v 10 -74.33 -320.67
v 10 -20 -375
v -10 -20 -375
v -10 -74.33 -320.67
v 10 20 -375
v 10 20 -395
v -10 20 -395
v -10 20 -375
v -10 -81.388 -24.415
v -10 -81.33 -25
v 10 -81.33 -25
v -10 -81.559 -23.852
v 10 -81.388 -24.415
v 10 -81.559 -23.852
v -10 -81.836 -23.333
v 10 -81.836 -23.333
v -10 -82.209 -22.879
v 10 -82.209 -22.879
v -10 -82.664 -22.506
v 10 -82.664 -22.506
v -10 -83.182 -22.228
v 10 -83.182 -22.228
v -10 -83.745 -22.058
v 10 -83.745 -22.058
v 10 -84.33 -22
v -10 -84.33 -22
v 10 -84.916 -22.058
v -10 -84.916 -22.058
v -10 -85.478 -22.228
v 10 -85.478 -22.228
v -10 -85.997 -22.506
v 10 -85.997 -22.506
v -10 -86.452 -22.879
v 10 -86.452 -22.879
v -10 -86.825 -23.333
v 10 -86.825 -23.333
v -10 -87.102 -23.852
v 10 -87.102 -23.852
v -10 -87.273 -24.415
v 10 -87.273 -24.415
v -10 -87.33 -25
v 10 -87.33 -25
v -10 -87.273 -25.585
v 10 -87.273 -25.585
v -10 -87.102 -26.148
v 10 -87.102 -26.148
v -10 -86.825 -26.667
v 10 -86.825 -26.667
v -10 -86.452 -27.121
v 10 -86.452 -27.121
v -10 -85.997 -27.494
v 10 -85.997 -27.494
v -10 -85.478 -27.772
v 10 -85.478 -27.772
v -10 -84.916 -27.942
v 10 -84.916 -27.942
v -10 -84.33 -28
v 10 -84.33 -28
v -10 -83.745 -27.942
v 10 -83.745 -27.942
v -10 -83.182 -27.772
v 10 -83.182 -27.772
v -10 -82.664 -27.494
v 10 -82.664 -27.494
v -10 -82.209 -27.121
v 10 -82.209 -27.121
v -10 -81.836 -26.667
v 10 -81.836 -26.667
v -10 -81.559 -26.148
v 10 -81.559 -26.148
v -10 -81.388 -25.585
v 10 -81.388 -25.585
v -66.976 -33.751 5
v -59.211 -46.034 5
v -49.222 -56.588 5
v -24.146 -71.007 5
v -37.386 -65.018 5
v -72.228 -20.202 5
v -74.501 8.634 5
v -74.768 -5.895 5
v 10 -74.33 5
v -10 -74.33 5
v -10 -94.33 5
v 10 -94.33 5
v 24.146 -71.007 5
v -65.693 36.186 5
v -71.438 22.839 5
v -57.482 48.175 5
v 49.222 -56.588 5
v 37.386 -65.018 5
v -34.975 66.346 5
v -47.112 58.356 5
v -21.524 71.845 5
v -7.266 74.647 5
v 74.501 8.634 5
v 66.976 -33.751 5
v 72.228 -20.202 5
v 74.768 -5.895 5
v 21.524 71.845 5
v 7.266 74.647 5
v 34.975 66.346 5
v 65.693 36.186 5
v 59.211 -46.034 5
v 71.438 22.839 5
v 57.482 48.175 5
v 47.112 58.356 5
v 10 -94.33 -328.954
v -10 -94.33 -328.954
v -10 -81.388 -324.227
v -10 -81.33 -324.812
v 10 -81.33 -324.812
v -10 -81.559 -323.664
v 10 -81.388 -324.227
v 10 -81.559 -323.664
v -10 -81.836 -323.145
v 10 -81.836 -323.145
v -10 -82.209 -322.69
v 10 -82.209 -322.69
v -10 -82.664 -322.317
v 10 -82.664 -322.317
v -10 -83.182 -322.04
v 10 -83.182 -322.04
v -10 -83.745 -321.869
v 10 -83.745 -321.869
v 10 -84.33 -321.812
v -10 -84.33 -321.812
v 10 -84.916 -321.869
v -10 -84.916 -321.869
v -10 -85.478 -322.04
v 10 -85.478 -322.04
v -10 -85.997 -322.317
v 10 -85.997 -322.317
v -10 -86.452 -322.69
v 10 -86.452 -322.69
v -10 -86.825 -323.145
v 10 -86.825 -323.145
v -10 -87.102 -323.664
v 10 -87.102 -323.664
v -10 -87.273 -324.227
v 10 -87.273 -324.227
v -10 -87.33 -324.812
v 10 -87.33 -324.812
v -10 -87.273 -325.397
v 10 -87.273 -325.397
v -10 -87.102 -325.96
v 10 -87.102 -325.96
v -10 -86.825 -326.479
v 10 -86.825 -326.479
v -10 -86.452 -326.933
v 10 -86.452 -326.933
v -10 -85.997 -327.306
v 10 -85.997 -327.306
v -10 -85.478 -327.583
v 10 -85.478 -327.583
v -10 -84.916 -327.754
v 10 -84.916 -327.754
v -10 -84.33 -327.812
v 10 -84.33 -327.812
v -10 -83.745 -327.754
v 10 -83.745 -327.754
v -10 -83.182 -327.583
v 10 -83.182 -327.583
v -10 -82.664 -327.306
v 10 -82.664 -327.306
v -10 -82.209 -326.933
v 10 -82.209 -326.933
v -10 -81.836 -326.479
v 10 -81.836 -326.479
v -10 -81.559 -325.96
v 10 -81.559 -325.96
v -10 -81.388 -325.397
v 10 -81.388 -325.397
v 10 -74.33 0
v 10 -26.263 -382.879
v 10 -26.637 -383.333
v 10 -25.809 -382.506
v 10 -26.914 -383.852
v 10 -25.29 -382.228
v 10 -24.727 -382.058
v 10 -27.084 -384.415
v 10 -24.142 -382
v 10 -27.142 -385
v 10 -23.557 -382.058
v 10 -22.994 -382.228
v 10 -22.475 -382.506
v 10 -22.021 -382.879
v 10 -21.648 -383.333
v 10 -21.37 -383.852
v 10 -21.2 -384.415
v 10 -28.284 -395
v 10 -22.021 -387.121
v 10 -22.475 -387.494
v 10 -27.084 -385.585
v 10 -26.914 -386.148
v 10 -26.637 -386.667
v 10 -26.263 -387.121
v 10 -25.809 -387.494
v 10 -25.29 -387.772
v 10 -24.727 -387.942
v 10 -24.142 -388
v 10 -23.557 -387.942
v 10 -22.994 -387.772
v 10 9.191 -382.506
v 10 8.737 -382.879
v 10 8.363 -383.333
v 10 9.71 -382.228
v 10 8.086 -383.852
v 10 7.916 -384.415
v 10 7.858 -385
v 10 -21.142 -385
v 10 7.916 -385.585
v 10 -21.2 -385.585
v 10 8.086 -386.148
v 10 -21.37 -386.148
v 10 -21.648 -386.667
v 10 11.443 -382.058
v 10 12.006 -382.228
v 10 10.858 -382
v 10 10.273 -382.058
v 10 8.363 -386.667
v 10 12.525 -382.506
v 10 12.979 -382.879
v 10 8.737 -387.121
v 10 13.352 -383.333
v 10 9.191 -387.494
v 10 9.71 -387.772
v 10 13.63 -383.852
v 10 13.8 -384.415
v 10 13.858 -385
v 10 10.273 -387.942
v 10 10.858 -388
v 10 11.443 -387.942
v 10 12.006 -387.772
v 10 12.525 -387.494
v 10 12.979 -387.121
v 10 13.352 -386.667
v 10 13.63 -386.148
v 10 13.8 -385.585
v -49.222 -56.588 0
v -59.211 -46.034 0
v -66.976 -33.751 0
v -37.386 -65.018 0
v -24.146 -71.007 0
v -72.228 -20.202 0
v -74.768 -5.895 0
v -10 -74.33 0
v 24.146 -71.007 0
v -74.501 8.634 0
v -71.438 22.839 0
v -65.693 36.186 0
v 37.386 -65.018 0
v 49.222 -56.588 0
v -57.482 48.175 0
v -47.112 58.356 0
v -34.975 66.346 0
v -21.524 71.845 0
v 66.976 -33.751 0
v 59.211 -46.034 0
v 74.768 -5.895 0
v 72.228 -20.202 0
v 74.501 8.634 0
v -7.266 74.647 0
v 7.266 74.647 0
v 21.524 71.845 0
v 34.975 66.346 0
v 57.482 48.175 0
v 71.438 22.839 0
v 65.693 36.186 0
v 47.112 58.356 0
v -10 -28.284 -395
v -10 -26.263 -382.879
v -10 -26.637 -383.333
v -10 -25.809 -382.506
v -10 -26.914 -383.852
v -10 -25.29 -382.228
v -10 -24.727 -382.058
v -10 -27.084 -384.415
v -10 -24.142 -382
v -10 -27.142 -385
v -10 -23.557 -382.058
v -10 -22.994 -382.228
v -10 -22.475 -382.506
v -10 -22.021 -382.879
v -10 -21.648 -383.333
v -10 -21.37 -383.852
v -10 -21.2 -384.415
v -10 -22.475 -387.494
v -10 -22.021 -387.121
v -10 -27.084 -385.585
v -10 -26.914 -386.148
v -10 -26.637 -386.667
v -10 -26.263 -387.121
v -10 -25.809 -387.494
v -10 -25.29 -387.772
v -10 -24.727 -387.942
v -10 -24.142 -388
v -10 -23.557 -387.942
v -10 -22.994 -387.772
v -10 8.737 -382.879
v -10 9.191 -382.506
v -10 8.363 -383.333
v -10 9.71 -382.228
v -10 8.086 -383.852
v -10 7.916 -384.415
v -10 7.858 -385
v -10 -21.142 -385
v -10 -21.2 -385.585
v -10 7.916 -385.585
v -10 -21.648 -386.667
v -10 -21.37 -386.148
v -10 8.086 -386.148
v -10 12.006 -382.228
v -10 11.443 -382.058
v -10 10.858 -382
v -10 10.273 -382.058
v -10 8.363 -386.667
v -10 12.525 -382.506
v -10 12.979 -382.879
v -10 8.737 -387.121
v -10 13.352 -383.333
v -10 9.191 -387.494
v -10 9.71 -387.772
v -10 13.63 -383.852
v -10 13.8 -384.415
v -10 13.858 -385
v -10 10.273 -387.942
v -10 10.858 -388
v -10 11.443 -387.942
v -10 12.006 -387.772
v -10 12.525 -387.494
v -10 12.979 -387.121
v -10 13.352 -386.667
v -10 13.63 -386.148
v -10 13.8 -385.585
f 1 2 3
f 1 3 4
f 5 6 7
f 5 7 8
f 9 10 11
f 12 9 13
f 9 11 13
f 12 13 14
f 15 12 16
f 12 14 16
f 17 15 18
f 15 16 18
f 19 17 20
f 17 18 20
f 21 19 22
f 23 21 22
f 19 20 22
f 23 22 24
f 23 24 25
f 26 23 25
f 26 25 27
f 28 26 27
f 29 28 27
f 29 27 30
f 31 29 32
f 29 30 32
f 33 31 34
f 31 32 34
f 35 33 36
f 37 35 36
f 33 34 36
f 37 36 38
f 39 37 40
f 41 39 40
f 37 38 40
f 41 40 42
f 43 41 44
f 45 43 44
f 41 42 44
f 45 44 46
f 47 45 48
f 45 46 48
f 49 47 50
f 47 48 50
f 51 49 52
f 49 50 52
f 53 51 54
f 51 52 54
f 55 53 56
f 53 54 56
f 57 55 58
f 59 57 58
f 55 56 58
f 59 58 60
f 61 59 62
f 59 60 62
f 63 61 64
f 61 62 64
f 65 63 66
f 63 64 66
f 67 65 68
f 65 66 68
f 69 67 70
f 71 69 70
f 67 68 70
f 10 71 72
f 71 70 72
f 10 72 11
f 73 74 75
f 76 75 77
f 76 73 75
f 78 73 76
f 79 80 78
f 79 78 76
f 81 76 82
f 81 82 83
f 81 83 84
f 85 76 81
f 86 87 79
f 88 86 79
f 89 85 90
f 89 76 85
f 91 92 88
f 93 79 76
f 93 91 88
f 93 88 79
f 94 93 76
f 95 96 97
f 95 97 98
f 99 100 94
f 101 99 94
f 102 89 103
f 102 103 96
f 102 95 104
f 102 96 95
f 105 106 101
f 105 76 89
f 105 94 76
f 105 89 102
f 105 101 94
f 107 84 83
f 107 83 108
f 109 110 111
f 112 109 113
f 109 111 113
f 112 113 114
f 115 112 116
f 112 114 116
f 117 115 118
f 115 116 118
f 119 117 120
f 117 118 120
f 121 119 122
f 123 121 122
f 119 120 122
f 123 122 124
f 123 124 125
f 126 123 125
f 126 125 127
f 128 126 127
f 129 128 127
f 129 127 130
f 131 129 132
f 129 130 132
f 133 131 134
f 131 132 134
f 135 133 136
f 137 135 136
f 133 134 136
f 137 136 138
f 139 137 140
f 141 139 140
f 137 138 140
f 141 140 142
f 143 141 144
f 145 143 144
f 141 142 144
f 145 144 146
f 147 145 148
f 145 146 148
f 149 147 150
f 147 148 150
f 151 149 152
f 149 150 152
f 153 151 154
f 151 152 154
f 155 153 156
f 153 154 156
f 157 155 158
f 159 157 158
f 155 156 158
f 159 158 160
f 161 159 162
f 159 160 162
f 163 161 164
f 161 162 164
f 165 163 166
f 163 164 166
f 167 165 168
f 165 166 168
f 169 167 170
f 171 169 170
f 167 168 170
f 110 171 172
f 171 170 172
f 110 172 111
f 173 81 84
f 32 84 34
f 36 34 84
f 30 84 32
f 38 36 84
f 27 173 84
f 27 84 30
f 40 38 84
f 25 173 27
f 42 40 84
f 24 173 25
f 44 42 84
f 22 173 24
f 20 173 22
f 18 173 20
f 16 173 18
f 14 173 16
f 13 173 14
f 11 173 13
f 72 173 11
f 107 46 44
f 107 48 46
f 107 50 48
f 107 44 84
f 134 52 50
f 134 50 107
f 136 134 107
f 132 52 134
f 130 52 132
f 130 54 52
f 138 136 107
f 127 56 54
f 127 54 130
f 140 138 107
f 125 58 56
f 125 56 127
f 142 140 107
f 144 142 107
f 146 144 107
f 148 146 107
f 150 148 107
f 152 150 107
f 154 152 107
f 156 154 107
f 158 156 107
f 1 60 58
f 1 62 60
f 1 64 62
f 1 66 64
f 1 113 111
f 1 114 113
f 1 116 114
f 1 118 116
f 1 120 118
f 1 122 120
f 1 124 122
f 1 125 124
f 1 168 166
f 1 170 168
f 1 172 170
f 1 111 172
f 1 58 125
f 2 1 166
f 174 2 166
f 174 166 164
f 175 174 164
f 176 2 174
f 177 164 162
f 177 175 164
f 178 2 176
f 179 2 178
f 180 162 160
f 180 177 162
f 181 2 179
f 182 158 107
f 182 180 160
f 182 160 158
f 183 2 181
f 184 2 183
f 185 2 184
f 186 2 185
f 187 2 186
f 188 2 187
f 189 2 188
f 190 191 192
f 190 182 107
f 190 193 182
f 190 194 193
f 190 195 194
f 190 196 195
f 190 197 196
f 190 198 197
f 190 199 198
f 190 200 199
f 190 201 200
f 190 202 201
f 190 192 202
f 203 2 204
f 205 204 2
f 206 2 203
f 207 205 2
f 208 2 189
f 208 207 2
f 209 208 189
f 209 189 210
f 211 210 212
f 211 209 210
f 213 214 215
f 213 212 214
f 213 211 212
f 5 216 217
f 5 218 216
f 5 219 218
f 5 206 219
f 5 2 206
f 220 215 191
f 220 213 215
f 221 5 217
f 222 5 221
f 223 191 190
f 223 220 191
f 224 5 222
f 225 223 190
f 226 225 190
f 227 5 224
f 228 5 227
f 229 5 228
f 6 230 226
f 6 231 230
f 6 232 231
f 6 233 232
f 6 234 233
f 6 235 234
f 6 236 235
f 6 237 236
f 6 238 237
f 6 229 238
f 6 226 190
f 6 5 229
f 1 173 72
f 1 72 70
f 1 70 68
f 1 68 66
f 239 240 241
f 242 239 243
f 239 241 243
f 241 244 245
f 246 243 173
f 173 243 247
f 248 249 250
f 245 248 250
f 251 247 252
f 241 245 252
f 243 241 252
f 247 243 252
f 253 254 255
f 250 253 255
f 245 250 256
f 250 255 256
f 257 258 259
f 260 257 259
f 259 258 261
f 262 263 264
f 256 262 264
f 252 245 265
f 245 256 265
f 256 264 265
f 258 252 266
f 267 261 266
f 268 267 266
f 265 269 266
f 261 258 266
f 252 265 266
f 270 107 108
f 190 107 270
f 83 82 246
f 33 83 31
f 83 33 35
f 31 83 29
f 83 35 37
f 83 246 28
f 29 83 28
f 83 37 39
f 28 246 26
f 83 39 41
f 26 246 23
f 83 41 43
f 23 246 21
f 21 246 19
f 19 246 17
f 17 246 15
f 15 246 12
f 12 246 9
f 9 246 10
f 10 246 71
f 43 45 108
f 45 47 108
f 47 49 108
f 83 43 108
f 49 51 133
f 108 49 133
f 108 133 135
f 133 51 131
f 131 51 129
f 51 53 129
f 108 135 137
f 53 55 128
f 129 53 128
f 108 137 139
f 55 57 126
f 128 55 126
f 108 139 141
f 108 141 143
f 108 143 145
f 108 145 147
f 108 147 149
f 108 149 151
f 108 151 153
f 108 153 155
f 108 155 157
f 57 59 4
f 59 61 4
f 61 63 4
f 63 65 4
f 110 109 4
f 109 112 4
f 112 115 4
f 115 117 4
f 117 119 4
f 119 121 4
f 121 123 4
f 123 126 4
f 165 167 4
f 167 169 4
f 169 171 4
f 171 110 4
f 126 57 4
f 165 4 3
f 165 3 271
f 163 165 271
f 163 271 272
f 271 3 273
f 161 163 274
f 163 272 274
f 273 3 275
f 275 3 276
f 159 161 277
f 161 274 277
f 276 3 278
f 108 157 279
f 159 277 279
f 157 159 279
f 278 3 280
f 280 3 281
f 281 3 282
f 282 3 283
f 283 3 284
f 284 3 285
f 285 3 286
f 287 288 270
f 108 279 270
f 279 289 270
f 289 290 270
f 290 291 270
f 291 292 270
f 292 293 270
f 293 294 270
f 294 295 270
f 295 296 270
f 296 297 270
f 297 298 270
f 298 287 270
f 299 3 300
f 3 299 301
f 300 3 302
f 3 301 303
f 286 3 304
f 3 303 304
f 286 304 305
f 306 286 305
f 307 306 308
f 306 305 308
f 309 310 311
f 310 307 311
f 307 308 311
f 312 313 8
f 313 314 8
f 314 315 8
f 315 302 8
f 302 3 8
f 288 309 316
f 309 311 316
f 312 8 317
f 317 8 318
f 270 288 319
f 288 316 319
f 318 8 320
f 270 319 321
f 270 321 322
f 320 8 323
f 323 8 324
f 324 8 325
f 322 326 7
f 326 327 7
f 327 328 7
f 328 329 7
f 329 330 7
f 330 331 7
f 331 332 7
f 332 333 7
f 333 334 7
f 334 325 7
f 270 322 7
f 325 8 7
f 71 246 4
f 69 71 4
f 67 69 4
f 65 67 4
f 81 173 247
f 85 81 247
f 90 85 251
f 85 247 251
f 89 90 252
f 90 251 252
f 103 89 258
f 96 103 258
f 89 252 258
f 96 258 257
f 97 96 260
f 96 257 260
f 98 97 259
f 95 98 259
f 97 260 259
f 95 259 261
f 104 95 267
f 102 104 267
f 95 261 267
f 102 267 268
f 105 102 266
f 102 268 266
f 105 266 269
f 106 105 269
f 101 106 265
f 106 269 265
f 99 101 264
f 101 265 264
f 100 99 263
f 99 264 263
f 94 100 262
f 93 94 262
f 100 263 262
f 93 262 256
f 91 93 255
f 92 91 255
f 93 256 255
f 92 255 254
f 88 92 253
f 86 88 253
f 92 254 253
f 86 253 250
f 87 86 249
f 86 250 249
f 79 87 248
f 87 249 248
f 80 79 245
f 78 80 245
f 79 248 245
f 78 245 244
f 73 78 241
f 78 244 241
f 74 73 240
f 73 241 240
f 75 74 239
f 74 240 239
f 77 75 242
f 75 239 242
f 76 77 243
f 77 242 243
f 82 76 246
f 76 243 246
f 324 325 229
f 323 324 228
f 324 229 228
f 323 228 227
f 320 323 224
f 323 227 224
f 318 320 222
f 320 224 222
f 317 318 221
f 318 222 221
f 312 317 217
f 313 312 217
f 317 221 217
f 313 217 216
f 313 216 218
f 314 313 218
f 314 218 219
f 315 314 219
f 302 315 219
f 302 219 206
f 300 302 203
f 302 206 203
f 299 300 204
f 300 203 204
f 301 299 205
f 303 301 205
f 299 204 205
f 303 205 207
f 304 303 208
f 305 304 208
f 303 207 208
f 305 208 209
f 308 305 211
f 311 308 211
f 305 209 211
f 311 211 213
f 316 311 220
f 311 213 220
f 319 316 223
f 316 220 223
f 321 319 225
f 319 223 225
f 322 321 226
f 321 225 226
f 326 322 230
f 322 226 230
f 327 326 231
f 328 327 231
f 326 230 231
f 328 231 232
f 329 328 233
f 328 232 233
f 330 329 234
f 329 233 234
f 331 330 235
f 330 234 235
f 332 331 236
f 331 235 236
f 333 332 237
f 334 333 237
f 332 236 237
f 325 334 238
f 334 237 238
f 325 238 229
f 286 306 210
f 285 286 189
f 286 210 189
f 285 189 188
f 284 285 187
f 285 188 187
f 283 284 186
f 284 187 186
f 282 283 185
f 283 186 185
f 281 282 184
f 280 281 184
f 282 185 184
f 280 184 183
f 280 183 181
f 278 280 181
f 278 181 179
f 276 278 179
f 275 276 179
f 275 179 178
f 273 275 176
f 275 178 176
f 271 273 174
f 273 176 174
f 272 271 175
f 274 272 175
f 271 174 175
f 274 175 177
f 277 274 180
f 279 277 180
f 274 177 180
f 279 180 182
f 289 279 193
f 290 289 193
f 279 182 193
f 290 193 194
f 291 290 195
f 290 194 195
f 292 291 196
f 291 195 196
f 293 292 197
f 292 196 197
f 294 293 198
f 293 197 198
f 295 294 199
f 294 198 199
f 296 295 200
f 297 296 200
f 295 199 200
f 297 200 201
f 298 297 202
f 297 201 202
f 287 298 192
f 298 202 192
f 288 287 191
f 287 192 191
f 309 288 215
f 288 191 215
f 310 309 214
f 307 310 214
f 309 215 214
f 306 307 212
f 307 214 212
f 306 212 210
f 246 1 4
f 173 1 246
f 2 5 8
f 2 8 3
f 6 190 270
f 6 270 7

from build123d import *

# Parameters (mm, degrees)
BOSS_EXTRU_1_DEPTH      = 5
BOSS_EXTRU_3_DEPTH      = 20
ESQUISSE7_R             = 3
ENL_V_MAT_EXTRU_1_DEPTH = 20


with BuildPart() as part:
    # Esquisse1 → Boss.-Extru.1 (new body)
    with BuildSketch(Plane.XY):
        with BuildLine():
            Line((-10, -74.330343737), (-10, -94.330343737))
            Line((-10, -94.330343737), (10, -94.330343737))
            Line((10, -94.330343737), (10, -74.330343737))
            ThreePointArc((10, -74.330343737), (0, 75), (-10, -74.330343737))
        make_face()
    extrude(amount=BOSS_EXTRU_1_DEPTH)

    # Esquisse6 → Boss.-Extru.3 (add)
    with BuildSketch(Plane(origin=(10, 0, 0), x_dir=(0, 0, -1), z_dir=(1, 0, 0))):
        Polygon((375, -20), (320.669656263, -74.330343737), (-5, -74.330343737), (-5, -94.330343737), (328.953927511, -94.330343737), (395, -28.284271247), (395, 20), (375, 20), align=None)
    extrude(amount=-BOSS_EXTRU_3_DEPTH)

    # Esquisse7 → Enlèv. mat.-Extru.1 (cut)
    with BuildSketch(Plane(origin=(10, 0, 0), x_dir=(0, 0, -1), z_dir=(1, 0, 0))):
        with Locations(Location((324.811791887, -84.330343737, 0), (0, 0, 90))):
            Circle(ESQUISSE7_R)
        with Locations(Location((385, -24.142135624, 0), (0, 0, 90))):
            Circle(ESQUISSE7_R)
        with Locations(Location((385, 10.857864376, 0), (0, 0, 90))):
            Circle(ESQUISSE7_R)
        with Locations(Location((25, -84.330343737, 0), (0, 0, 90))):
            Circle(ESQUISSE7_R)
    extrude(amount=-ENL_V_MAT_EXTRU_1_DEPTH, mode=Mode.SUBTRACT)


solid = part.part
